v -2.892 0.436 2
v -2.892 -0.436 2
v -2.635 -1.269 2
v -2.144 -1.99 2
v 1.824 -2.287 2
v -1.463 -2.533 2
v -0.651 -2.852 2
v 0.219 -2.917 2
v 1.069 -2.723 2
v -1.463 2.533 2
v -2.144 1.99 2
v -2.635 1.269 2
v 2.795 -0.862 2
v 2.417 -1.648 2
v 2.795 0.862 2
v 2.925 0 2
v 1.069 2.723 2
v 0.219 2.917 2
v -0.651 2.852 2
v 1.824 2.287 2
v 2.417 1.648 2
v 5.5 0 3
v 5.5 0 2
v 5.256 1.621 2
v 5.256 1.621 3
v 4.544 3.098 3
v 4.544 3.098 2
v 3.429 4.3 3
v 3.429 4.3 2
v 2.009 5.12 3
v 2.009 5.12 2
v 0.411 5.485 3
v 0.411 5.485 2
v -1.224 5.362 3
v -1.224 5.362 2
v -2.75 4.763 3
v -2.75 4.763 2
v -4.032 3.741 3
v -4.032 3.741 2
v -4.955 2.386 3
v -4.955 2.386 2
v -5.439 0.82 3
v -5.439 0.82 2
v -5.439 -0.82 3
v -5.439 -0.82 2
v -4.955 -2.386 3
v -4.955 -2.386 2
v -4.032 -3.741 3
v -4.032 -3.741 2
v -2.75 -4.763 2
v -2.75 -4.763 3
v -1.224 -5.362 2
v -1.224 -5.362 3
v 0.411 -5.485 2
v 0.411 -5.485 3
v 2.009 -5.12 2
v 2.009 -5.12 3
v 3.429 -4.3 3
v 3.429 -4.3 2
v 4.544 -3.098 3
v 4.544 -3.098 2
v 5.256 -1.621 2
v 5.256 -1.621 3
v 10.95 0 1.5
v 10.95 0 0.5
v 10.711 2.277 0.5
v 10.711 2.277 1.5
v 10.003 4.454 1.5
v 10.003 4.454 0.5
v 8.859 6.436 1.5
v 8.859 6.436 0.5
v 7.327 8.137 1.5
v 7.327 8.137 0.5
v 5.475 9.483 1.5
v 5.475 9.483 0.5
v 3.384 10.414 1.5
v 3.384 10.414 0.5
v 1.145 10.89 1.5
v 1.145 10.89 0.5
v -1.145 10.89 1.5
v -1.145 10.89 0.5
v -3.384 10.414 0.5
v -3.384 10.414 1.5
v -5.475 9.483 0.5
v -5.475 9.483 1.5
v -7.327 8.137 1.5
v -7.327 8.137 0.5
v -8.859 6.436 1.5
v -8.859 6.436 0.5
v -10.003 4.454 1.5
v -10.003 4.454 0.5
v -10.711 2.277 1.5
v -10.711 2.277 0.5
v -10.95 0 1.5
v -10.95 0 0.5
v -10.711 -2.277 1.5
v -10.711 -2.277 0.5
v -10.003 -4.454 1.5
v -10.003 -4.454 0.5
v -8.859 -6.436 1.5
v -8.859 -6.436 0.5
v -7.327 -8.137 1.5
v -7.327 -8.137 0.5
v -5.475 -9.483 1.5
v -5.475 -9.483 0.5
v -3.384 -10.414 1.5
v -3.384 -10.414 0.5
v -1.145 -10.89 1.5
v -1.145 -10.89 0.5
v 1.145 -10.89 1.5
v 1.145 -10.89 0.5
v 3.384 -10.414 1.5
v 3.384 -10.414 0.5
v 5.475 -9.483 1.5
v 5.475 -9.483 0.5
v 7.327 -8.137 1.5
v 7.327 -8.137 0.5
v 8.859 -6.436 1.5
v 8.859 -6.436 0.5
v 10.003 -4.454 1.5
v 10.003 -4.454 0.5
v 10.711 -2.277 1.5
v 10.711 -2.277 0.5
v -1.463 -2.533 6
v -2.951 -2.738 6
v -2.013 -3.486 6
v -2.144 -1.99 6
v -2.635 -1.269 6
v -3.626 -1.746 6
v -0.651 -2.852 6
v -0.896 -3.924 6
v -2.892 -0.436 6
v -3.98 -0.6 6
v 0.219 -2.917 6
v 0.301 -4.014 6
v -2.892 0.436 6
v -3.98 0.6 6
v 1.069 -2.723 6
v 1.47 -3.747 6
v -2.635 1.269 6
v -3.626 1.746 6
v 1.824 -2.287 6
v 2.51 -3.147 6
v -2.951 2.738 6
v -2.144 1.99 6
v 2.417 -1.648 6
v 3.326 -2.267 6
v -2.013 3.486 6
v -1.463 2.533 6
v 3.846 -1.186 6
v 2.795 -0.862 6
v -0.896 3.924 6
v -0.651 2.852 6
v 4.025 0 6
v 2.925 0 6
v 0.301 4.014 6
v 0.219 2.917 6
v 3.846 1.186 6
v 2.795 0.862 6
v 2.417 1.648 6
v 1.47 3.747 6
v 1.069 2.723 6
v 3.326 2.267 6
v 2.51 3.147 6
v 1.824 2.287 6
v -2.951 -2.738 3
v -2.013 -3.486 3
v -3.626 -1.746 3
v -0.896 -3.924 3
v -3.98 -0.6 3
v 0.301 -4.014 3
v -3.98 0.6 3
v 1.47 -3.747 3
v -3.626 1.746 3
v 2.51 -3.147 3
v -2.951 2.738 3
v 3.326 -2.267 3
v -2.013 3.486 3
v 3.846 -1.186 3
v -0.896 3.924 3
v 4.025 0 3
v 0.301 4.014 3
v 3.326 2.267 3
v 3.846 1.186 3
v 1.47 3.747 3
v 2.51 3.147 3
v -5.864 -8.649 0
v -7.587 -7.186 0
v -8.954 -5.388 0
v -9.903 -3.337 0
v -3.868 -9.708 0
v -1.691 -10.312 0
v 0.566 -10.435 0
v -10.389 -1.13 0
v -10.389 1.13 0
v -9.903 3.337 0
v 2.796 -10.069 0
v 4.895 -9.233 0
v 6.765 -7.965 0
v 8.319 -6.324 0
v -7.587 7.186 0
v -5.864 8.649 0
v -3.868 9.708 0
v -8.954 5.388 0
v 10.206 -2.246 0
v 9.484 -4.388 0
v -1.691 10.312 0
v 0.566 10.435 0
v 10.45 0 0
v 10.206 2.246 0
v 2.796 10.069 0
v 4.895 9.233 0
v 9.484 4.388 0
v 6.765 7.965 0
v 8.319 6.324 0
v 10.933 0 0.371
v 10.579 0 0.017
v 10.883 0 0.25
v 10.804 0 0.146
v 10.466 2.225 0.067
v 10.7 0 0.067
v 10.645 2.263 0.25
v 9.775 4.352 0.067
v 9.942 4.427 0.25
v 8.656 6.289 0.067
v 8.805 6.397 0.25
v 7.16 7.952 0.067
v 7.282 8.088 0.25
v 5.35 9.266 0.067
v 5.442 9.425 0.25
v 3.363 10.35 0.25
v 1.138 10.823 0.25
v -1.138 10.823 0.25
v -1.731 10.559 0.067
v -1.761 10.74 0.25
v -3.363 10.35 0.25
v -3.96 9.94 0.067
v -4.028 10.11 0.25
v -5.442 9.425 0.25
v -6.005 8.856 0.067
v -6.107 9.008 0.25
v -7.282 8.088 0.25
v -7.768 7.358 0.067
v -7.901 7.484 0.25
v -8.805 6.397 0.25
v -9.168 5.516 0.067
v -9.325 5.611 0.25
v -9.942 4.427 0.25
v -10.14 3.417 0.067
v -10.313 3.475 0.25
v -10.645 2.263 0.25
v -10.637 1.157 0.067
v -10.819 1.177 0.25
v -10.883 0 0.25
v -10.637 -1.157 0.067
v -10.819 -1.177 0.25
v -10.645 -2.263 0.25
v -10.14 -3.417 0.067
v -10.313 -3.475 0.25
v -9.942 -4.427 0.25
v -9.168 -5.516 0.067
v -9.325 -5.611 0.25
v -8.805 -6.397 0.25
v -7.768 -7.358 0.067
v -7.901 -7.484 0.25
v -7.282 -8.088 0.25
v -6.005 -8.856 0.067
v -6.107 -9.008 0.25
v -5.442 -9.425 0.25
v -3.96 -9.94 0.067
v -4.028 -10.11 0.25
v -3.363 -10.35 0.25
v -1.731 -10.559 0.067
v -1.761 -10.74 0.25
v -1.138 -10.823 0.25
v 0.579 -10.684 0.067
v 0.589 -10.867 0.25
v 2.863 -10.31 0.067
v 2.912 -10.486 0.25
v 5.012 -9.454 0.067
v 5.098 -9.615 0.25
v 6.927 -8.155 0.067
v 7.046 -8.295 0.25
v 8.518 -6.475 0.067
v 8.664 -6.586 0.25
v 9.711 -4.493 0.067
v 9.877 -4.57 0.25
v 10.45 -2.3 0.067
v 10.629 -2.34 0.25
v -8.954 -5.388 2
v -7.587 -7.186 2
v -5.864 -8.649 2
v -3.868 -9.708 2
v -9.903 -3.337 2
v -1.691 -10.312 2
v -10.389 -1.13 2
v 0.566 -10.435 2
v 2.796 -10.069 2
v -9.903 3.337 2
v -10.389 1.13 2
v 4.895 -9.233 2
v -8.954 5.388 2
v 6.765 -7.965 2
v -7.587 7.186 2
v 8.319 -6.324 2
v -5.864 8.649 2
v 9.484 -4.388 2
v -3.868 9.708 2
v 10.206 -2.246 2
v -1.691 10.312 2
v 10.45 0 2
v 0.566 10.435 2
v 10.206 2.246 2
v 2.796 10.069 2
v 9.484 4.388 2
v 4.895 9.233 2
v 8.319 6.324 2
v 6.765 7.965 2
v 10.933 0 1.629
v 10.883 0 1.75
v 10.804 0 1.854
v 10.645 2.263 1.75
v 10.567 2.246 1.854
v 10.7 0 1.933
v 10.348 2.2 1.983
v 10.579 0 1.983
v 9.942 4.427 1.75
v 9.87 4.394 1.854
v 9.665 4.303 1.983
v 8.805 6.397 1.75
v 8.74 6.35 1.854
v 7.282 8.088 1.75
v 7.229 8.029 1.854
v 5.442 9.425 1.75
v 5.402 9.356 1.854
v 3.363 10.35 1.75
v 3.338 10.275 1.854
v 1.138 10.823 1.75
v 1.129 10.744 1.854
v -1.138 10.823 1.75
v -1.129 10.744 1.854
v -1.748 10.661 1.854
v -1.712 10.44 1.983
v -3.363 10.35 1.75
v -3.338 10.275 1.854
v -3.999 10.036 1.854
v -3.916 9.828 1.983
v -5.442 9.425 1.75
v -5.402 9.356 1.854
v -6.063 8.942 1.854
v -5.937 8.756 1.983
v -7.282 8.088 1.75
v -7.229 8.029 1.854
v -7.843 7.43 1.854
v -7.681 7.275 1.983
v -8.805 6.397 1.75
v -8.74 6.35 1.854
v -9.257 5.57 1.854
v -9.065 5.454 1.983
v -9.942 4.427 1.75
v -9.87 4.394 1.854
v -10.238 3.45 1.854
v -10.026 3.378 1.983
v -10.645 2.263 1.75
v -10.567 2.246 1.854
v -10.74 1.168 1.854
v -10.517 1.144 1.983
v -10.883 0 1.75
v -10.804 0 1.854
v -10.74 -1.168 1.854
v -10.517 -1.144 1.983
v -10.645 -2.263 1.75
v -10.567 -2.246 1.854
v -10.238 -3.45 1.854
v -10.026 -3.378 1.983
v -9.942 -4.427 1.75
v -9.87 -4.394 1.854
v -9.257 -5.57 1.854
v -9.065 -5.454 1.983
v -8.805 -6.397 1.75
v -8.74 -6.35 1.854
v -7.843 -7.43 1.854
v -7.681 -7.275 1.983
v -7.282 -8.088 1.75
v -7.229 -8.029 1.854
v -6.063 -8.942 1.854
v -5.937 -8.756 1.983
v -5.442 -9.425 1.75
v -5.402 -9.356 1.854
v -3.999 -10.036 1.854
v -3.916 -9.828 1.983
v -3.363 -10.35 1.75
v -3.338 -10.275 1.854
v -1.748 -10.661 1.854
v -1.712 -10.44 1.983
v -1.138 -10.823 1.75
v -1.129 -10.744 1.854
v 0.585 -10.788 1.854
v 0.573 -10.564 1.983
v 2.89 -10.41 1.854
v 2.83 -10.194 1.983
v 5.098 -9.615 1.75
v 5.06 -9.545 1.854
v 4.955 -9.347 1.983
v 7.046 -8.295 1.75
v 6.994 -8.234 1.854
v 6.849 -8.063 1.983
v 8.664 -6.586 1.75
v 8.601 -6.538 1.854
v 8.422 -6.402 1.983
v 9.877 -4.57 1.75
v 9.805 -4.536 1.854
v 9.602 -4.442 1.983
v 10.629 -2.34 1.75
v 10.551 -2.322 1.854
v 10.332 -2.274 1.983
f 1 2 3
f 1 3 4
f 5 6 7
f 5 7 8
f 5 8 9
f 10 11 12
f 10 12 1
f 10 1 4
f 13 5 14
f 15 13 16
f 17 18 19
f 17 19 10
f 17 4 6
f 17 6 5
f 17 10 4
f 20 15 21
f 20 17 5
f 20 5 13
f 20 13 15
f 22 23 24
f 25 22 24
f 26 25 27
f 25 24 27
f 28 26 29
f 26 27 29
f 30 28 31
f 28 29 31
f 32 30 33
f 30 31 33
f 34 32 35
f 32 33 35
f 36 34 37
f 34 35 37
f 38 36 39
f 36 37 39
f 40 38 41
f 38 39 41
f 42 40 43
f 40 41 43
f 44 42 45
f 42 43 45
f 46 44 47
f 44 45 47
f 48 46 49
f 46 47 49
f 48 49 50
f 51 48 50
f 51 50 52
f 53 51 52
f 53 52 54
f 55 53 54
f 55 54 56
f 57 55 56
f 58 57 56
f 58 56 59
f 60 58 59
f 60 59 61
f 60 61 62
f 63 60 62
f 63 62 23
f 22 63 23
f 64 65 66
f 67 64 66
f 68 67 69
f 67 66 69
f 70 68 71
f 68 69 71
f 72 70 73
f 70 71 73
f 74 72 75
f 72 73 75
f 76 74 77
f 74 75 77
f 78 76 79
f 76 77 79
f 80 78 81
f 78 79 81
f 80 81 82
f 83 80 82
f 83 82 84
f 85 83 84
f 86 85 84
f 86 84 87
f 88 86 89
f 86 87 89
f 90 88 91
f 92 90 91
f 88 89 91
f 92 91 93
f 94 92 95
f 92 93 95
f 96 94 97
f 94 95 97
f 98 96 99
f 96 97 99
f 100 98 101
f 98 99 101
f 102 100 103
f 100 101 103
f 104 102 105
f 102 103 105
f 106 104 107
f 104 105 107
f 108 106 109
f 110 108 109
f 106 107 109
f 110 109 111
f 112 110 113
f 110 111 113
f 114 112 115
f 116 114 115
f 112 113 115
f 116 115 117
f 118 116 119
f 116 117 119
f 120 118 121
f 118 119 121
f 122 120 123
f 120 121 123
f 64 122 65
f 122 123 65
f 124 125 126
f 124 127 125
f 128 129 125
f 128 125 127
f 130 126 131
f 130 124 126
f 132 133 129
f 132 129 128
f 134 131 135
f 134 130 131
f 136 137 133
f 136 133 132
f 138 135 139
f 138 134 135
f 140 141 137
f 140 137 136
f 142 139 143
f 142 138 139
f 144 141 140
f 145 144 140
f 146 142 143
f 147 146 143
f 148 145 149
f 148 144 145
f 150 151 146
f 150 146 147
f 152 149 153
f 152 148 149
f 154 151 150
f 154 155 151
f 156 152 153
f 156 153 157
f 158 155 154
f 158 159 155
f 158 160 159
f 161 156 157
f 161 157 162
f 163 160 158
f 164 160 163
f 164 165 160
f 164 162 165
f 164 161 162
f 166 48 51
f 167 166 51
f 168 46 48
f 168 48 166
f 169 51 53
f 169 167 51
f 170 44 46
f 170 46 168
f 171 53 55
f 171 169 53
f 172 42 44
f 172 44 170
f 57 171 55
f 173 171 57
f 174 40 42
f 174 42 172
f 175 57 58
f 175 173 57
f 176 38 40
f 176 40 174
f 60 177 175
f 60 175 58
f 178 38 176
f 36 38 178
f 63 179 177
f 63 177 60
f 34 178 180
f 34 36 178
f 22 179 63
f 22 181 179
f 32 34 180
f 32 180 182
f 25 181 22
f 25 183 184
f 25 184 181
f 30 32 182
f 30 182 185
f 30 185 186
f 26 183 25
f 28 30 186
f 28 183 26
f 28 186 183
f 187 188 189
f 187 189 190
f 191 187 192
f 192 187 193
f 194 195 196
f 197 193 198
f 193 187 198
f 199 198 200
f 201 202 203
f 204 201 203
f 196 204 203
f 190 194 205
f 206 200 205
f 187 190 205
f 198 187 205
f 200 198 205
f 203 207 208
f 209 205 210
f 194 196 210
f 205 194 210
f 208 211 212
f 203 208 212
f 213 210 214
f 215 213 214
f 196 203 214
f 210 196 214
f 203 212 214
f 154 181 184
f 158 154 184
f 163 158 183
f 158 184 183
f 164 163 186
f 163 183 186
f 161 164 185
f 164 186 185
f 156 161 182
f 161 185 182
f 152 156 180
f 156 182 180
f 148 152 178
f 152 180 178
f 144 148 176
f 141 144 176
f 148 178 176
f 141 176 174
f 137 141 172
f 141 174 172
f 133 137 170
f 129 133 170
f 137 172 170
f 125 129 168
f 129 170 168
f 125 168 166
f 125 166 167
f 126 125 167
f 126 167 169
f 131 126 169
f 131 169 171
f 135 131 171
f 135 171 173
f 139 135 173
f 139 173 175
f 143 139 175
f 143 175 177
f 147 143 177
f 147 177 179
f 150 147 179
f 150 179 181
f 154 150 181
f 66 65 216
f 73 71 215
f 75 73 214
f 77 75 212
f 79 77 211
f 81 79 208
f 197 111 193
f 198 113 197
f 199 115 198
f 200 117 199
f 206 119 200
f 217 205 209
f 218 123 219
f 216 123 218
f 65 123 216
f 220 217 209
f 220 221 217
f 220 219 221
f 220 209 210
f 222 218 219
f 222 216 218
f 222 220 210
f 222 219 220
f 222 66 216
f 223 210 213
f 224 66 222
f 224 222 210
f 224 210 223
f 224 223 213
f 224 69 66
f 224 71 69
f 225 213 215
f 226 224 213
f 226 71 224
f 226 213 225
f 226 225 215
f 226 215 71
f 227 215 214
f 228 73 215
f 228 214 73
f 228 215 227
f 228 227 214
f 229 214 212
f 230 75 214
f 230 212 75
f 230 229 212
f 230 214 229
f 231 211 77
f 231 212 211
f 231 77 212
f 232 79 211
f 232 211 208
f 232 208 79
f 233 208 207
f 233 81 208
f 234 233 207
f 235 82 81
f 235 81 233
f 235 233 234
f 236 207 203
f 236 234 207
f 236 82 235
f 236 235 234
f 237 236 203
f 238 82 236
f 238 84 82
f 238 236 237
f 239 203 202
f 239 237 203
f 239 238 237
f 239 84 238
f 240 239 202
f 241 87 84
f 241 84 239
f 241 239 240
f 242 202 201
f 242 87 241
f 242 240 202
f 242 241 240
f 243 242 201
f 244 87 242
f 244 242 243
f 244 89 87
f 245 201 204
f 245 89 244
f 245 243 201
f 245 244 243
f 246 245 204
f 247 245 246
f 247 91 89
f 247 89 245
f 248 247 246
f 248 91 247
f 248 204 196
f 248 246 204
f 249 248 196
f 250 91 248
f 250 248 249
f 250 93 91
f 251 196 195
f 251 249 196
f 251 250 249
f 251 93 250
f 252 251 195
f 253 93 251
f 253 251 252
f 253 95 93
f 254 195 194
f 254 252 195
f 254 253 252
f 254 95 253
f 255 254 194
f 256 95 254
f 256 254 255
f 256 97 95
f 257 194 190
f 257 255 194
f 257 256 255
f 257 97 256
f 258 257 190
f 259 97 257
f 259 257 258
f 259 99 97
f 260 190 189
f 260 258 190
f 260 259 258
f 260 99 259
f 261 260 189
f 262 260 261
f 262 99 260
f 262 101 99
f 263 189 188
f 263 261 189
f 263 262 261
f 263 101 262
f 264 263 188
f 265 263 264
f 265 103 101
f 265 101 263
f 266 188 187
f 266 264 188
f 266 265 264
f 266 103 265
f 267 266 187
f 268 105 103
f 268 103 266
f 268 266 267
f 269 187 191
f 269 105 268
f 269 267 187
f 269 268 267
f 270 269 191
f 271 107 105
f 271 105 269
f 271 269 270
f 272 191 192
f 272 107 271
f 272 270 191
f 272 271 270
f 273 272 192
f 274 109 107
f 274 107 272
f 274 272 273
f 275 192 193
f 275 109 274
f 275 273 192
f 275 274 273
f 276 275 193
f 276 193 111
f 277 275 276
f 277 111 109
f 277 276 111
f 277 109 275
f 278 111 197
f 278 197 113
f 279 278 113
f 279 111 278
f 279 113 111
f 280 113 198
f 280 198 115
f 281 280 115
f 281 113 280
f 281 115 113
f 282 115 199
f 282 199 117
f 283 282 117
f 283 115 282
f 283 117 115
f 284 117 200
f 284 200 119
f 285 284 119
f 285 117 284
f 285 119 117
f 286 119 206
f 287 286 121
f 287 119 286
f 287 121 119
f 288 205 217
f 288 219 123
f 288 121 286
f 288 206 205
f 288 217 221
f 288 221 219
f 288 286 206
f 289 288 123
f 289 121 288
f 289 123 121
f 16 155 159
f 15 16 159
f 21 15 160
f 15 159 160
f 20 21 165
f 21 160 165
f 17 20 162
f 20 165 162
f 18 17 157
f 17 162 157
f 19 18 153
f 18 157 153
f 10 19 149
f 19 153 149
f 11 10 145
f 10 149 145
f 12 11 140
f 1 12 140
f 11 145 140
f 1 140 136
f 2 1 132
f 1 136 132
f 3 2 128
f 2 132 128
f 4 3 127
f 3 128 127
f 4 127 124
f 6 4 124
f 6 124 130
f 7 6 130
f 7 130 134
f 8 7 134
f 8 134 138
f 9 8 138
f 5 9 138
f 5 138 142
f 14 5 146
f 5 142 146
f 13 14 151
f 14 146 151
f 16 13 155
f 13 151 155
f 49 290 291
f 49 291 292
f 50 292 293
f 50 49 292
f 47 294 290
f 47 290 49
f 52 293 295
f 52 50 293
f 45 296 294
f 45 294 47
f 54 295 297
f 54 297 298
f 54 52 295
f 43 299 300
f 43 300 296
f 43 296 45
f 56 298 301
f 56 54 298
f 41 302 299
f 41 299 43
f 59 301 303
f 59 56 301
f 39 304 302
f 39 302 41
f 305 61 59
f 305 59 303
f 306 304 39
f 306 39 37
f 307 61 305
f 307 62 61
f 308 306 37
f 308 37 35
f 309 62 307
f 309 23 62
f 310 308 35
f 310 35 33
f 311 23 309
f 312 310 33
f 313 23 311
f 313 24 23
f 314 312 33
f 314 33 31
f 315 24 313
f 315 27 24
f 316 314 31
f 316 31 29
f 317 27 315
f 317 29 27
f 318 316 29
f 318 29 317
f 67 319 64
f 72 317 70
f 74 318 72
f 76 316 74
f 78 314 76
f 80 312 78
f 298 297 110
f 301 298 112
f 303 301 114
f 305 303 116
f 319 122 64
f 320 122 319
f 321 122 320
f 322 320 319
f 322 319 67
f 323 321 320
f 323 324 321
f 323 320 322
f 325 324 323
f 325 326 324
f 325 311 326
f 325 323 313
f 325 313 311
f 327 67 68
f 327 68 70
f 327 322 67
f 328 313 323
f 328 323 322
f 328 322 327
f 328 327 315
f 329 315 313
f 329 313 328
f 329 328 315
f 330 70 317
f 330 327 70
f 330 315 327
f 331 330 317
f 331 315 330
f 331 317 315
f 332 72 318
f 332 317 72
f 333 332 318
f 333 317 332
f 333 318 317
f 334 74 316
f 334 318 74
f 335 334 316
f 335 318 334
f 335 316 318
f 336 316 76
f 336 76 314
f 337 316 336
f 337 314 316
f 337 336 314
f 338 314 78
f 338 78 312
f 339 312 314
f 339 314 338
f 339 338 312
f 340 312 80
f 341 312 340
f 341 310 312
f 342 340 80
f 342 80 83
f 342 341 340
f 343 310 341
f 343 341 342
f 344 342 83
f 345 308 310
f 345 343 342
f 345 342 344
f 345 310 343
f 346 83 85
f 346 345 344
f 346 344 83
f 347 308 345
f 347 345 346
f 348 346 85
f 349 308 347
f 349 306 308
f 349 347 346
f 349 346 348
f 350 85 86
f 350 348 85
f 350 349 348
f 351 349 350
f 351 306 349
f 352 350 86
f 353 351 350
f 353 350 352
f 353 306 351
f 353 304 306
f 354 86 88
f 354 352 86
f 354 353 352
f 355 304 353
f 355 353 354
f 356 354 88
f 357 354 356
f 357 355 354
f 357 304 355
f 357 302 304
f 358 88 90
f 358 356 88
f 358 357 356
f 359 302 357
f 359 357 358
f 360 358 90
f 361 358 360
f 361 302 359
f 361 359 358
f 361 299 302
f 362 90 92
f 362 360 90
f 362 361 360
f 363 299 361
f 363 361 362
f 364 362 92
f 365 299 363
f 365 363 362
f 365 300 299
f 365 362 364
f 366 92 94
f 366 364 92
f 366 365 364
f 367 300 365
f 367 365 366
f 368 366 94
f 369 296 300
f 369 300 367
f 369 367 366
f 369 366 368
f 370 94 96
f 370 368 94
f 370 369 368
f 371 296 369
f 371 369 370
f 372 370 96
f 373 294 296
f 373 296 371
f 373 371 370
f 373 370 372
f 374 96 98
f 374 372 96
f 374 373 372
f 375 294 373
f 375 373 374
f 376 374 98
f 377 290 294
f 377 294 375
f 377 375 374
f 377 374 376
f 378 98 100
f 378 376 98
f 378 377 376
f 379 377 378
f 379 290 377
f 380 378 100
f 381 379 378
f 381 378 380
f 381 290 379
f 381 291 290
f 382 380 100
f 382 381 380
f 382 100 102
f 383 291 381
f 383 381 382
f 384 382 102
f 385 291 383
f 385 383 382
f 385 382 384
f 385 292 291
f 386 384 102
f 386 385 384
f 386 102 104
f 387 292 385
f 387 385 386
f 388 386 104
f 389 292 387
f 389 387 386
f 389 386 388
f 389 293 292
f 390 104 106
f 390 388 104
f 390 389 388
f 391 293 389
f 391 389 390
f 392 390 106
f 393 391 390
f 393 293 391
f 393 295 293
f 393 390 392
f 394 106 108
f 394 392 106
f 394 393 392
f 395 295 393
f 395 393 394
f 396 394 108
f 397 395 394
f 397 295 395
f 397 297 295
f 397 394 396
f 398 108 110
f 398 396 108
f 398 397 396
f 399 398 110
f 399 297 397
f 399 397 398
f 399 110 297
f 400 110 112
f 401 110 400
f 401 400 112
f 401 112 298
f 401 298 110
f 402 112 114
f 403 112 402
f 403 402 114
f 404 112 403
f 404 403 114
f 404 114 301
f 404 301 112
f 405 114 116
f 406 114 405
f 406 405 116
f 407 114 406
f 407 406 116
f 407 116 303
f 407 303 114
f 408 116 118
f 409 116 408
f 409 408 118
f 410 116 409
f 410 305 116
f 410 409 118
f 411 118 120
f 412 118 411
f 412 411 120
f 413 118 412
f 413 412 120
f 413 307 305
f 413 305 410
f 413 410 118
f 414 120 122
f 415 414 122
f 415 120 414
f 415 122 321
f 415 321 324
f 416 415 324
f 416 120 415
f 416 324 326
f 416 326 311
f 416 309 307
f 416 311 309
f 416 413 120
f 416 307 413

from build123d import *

# Parameters (mm, degrees)
F0_R     = 10.95
F0_R_2   = 0.069
F3_DEPTH = 2
F1_R     = 5.5
F4_DEPTH = 3
F2_R     = 4.025
F5_DEPTH = 6
F6_R     = 0.5
F7_R     = 2.925
F8_DEPTH = 4


with BuildPart() as f3:
    # F0 (on Top) → F3 (new body)
    with BuildSketch(Plane.XY):
        Circle(F0_R)
        Circle(F0_R_2, mode=Mode.SUBTRACT)
    extrude(amount=F3_DEPTH)

    # F1 (on Top) → F4 (join)
    with BuildSketch(Plane.XY):
        Circle(F1_R)
    extrude(amount=F4_DEPTH)

    # F2 (on Top) → F5 (join)
    with BuildSketch(Plane.XY):
        Circle(F2_R)
    extrude(amount=F5_DEPTH)

    # F6
    f6_edges = [f3.edges().sort_by_distance(p)[0] for p in [
        (10.95, 0, 1),
        (-10.95, 0, 0),
        (-10.95, 0, 2),
    ]]
    fillet(f6_edges, radius=F6_R)

    # F7 (on face) → F8 (cut)
    with BuildSketch(Plane.XY.offset(6)):
        Circle(F7_R)
    extrude(amount=-F8_DEPTH, mode=Mode.SUBTRACT)


solid = f3.part
